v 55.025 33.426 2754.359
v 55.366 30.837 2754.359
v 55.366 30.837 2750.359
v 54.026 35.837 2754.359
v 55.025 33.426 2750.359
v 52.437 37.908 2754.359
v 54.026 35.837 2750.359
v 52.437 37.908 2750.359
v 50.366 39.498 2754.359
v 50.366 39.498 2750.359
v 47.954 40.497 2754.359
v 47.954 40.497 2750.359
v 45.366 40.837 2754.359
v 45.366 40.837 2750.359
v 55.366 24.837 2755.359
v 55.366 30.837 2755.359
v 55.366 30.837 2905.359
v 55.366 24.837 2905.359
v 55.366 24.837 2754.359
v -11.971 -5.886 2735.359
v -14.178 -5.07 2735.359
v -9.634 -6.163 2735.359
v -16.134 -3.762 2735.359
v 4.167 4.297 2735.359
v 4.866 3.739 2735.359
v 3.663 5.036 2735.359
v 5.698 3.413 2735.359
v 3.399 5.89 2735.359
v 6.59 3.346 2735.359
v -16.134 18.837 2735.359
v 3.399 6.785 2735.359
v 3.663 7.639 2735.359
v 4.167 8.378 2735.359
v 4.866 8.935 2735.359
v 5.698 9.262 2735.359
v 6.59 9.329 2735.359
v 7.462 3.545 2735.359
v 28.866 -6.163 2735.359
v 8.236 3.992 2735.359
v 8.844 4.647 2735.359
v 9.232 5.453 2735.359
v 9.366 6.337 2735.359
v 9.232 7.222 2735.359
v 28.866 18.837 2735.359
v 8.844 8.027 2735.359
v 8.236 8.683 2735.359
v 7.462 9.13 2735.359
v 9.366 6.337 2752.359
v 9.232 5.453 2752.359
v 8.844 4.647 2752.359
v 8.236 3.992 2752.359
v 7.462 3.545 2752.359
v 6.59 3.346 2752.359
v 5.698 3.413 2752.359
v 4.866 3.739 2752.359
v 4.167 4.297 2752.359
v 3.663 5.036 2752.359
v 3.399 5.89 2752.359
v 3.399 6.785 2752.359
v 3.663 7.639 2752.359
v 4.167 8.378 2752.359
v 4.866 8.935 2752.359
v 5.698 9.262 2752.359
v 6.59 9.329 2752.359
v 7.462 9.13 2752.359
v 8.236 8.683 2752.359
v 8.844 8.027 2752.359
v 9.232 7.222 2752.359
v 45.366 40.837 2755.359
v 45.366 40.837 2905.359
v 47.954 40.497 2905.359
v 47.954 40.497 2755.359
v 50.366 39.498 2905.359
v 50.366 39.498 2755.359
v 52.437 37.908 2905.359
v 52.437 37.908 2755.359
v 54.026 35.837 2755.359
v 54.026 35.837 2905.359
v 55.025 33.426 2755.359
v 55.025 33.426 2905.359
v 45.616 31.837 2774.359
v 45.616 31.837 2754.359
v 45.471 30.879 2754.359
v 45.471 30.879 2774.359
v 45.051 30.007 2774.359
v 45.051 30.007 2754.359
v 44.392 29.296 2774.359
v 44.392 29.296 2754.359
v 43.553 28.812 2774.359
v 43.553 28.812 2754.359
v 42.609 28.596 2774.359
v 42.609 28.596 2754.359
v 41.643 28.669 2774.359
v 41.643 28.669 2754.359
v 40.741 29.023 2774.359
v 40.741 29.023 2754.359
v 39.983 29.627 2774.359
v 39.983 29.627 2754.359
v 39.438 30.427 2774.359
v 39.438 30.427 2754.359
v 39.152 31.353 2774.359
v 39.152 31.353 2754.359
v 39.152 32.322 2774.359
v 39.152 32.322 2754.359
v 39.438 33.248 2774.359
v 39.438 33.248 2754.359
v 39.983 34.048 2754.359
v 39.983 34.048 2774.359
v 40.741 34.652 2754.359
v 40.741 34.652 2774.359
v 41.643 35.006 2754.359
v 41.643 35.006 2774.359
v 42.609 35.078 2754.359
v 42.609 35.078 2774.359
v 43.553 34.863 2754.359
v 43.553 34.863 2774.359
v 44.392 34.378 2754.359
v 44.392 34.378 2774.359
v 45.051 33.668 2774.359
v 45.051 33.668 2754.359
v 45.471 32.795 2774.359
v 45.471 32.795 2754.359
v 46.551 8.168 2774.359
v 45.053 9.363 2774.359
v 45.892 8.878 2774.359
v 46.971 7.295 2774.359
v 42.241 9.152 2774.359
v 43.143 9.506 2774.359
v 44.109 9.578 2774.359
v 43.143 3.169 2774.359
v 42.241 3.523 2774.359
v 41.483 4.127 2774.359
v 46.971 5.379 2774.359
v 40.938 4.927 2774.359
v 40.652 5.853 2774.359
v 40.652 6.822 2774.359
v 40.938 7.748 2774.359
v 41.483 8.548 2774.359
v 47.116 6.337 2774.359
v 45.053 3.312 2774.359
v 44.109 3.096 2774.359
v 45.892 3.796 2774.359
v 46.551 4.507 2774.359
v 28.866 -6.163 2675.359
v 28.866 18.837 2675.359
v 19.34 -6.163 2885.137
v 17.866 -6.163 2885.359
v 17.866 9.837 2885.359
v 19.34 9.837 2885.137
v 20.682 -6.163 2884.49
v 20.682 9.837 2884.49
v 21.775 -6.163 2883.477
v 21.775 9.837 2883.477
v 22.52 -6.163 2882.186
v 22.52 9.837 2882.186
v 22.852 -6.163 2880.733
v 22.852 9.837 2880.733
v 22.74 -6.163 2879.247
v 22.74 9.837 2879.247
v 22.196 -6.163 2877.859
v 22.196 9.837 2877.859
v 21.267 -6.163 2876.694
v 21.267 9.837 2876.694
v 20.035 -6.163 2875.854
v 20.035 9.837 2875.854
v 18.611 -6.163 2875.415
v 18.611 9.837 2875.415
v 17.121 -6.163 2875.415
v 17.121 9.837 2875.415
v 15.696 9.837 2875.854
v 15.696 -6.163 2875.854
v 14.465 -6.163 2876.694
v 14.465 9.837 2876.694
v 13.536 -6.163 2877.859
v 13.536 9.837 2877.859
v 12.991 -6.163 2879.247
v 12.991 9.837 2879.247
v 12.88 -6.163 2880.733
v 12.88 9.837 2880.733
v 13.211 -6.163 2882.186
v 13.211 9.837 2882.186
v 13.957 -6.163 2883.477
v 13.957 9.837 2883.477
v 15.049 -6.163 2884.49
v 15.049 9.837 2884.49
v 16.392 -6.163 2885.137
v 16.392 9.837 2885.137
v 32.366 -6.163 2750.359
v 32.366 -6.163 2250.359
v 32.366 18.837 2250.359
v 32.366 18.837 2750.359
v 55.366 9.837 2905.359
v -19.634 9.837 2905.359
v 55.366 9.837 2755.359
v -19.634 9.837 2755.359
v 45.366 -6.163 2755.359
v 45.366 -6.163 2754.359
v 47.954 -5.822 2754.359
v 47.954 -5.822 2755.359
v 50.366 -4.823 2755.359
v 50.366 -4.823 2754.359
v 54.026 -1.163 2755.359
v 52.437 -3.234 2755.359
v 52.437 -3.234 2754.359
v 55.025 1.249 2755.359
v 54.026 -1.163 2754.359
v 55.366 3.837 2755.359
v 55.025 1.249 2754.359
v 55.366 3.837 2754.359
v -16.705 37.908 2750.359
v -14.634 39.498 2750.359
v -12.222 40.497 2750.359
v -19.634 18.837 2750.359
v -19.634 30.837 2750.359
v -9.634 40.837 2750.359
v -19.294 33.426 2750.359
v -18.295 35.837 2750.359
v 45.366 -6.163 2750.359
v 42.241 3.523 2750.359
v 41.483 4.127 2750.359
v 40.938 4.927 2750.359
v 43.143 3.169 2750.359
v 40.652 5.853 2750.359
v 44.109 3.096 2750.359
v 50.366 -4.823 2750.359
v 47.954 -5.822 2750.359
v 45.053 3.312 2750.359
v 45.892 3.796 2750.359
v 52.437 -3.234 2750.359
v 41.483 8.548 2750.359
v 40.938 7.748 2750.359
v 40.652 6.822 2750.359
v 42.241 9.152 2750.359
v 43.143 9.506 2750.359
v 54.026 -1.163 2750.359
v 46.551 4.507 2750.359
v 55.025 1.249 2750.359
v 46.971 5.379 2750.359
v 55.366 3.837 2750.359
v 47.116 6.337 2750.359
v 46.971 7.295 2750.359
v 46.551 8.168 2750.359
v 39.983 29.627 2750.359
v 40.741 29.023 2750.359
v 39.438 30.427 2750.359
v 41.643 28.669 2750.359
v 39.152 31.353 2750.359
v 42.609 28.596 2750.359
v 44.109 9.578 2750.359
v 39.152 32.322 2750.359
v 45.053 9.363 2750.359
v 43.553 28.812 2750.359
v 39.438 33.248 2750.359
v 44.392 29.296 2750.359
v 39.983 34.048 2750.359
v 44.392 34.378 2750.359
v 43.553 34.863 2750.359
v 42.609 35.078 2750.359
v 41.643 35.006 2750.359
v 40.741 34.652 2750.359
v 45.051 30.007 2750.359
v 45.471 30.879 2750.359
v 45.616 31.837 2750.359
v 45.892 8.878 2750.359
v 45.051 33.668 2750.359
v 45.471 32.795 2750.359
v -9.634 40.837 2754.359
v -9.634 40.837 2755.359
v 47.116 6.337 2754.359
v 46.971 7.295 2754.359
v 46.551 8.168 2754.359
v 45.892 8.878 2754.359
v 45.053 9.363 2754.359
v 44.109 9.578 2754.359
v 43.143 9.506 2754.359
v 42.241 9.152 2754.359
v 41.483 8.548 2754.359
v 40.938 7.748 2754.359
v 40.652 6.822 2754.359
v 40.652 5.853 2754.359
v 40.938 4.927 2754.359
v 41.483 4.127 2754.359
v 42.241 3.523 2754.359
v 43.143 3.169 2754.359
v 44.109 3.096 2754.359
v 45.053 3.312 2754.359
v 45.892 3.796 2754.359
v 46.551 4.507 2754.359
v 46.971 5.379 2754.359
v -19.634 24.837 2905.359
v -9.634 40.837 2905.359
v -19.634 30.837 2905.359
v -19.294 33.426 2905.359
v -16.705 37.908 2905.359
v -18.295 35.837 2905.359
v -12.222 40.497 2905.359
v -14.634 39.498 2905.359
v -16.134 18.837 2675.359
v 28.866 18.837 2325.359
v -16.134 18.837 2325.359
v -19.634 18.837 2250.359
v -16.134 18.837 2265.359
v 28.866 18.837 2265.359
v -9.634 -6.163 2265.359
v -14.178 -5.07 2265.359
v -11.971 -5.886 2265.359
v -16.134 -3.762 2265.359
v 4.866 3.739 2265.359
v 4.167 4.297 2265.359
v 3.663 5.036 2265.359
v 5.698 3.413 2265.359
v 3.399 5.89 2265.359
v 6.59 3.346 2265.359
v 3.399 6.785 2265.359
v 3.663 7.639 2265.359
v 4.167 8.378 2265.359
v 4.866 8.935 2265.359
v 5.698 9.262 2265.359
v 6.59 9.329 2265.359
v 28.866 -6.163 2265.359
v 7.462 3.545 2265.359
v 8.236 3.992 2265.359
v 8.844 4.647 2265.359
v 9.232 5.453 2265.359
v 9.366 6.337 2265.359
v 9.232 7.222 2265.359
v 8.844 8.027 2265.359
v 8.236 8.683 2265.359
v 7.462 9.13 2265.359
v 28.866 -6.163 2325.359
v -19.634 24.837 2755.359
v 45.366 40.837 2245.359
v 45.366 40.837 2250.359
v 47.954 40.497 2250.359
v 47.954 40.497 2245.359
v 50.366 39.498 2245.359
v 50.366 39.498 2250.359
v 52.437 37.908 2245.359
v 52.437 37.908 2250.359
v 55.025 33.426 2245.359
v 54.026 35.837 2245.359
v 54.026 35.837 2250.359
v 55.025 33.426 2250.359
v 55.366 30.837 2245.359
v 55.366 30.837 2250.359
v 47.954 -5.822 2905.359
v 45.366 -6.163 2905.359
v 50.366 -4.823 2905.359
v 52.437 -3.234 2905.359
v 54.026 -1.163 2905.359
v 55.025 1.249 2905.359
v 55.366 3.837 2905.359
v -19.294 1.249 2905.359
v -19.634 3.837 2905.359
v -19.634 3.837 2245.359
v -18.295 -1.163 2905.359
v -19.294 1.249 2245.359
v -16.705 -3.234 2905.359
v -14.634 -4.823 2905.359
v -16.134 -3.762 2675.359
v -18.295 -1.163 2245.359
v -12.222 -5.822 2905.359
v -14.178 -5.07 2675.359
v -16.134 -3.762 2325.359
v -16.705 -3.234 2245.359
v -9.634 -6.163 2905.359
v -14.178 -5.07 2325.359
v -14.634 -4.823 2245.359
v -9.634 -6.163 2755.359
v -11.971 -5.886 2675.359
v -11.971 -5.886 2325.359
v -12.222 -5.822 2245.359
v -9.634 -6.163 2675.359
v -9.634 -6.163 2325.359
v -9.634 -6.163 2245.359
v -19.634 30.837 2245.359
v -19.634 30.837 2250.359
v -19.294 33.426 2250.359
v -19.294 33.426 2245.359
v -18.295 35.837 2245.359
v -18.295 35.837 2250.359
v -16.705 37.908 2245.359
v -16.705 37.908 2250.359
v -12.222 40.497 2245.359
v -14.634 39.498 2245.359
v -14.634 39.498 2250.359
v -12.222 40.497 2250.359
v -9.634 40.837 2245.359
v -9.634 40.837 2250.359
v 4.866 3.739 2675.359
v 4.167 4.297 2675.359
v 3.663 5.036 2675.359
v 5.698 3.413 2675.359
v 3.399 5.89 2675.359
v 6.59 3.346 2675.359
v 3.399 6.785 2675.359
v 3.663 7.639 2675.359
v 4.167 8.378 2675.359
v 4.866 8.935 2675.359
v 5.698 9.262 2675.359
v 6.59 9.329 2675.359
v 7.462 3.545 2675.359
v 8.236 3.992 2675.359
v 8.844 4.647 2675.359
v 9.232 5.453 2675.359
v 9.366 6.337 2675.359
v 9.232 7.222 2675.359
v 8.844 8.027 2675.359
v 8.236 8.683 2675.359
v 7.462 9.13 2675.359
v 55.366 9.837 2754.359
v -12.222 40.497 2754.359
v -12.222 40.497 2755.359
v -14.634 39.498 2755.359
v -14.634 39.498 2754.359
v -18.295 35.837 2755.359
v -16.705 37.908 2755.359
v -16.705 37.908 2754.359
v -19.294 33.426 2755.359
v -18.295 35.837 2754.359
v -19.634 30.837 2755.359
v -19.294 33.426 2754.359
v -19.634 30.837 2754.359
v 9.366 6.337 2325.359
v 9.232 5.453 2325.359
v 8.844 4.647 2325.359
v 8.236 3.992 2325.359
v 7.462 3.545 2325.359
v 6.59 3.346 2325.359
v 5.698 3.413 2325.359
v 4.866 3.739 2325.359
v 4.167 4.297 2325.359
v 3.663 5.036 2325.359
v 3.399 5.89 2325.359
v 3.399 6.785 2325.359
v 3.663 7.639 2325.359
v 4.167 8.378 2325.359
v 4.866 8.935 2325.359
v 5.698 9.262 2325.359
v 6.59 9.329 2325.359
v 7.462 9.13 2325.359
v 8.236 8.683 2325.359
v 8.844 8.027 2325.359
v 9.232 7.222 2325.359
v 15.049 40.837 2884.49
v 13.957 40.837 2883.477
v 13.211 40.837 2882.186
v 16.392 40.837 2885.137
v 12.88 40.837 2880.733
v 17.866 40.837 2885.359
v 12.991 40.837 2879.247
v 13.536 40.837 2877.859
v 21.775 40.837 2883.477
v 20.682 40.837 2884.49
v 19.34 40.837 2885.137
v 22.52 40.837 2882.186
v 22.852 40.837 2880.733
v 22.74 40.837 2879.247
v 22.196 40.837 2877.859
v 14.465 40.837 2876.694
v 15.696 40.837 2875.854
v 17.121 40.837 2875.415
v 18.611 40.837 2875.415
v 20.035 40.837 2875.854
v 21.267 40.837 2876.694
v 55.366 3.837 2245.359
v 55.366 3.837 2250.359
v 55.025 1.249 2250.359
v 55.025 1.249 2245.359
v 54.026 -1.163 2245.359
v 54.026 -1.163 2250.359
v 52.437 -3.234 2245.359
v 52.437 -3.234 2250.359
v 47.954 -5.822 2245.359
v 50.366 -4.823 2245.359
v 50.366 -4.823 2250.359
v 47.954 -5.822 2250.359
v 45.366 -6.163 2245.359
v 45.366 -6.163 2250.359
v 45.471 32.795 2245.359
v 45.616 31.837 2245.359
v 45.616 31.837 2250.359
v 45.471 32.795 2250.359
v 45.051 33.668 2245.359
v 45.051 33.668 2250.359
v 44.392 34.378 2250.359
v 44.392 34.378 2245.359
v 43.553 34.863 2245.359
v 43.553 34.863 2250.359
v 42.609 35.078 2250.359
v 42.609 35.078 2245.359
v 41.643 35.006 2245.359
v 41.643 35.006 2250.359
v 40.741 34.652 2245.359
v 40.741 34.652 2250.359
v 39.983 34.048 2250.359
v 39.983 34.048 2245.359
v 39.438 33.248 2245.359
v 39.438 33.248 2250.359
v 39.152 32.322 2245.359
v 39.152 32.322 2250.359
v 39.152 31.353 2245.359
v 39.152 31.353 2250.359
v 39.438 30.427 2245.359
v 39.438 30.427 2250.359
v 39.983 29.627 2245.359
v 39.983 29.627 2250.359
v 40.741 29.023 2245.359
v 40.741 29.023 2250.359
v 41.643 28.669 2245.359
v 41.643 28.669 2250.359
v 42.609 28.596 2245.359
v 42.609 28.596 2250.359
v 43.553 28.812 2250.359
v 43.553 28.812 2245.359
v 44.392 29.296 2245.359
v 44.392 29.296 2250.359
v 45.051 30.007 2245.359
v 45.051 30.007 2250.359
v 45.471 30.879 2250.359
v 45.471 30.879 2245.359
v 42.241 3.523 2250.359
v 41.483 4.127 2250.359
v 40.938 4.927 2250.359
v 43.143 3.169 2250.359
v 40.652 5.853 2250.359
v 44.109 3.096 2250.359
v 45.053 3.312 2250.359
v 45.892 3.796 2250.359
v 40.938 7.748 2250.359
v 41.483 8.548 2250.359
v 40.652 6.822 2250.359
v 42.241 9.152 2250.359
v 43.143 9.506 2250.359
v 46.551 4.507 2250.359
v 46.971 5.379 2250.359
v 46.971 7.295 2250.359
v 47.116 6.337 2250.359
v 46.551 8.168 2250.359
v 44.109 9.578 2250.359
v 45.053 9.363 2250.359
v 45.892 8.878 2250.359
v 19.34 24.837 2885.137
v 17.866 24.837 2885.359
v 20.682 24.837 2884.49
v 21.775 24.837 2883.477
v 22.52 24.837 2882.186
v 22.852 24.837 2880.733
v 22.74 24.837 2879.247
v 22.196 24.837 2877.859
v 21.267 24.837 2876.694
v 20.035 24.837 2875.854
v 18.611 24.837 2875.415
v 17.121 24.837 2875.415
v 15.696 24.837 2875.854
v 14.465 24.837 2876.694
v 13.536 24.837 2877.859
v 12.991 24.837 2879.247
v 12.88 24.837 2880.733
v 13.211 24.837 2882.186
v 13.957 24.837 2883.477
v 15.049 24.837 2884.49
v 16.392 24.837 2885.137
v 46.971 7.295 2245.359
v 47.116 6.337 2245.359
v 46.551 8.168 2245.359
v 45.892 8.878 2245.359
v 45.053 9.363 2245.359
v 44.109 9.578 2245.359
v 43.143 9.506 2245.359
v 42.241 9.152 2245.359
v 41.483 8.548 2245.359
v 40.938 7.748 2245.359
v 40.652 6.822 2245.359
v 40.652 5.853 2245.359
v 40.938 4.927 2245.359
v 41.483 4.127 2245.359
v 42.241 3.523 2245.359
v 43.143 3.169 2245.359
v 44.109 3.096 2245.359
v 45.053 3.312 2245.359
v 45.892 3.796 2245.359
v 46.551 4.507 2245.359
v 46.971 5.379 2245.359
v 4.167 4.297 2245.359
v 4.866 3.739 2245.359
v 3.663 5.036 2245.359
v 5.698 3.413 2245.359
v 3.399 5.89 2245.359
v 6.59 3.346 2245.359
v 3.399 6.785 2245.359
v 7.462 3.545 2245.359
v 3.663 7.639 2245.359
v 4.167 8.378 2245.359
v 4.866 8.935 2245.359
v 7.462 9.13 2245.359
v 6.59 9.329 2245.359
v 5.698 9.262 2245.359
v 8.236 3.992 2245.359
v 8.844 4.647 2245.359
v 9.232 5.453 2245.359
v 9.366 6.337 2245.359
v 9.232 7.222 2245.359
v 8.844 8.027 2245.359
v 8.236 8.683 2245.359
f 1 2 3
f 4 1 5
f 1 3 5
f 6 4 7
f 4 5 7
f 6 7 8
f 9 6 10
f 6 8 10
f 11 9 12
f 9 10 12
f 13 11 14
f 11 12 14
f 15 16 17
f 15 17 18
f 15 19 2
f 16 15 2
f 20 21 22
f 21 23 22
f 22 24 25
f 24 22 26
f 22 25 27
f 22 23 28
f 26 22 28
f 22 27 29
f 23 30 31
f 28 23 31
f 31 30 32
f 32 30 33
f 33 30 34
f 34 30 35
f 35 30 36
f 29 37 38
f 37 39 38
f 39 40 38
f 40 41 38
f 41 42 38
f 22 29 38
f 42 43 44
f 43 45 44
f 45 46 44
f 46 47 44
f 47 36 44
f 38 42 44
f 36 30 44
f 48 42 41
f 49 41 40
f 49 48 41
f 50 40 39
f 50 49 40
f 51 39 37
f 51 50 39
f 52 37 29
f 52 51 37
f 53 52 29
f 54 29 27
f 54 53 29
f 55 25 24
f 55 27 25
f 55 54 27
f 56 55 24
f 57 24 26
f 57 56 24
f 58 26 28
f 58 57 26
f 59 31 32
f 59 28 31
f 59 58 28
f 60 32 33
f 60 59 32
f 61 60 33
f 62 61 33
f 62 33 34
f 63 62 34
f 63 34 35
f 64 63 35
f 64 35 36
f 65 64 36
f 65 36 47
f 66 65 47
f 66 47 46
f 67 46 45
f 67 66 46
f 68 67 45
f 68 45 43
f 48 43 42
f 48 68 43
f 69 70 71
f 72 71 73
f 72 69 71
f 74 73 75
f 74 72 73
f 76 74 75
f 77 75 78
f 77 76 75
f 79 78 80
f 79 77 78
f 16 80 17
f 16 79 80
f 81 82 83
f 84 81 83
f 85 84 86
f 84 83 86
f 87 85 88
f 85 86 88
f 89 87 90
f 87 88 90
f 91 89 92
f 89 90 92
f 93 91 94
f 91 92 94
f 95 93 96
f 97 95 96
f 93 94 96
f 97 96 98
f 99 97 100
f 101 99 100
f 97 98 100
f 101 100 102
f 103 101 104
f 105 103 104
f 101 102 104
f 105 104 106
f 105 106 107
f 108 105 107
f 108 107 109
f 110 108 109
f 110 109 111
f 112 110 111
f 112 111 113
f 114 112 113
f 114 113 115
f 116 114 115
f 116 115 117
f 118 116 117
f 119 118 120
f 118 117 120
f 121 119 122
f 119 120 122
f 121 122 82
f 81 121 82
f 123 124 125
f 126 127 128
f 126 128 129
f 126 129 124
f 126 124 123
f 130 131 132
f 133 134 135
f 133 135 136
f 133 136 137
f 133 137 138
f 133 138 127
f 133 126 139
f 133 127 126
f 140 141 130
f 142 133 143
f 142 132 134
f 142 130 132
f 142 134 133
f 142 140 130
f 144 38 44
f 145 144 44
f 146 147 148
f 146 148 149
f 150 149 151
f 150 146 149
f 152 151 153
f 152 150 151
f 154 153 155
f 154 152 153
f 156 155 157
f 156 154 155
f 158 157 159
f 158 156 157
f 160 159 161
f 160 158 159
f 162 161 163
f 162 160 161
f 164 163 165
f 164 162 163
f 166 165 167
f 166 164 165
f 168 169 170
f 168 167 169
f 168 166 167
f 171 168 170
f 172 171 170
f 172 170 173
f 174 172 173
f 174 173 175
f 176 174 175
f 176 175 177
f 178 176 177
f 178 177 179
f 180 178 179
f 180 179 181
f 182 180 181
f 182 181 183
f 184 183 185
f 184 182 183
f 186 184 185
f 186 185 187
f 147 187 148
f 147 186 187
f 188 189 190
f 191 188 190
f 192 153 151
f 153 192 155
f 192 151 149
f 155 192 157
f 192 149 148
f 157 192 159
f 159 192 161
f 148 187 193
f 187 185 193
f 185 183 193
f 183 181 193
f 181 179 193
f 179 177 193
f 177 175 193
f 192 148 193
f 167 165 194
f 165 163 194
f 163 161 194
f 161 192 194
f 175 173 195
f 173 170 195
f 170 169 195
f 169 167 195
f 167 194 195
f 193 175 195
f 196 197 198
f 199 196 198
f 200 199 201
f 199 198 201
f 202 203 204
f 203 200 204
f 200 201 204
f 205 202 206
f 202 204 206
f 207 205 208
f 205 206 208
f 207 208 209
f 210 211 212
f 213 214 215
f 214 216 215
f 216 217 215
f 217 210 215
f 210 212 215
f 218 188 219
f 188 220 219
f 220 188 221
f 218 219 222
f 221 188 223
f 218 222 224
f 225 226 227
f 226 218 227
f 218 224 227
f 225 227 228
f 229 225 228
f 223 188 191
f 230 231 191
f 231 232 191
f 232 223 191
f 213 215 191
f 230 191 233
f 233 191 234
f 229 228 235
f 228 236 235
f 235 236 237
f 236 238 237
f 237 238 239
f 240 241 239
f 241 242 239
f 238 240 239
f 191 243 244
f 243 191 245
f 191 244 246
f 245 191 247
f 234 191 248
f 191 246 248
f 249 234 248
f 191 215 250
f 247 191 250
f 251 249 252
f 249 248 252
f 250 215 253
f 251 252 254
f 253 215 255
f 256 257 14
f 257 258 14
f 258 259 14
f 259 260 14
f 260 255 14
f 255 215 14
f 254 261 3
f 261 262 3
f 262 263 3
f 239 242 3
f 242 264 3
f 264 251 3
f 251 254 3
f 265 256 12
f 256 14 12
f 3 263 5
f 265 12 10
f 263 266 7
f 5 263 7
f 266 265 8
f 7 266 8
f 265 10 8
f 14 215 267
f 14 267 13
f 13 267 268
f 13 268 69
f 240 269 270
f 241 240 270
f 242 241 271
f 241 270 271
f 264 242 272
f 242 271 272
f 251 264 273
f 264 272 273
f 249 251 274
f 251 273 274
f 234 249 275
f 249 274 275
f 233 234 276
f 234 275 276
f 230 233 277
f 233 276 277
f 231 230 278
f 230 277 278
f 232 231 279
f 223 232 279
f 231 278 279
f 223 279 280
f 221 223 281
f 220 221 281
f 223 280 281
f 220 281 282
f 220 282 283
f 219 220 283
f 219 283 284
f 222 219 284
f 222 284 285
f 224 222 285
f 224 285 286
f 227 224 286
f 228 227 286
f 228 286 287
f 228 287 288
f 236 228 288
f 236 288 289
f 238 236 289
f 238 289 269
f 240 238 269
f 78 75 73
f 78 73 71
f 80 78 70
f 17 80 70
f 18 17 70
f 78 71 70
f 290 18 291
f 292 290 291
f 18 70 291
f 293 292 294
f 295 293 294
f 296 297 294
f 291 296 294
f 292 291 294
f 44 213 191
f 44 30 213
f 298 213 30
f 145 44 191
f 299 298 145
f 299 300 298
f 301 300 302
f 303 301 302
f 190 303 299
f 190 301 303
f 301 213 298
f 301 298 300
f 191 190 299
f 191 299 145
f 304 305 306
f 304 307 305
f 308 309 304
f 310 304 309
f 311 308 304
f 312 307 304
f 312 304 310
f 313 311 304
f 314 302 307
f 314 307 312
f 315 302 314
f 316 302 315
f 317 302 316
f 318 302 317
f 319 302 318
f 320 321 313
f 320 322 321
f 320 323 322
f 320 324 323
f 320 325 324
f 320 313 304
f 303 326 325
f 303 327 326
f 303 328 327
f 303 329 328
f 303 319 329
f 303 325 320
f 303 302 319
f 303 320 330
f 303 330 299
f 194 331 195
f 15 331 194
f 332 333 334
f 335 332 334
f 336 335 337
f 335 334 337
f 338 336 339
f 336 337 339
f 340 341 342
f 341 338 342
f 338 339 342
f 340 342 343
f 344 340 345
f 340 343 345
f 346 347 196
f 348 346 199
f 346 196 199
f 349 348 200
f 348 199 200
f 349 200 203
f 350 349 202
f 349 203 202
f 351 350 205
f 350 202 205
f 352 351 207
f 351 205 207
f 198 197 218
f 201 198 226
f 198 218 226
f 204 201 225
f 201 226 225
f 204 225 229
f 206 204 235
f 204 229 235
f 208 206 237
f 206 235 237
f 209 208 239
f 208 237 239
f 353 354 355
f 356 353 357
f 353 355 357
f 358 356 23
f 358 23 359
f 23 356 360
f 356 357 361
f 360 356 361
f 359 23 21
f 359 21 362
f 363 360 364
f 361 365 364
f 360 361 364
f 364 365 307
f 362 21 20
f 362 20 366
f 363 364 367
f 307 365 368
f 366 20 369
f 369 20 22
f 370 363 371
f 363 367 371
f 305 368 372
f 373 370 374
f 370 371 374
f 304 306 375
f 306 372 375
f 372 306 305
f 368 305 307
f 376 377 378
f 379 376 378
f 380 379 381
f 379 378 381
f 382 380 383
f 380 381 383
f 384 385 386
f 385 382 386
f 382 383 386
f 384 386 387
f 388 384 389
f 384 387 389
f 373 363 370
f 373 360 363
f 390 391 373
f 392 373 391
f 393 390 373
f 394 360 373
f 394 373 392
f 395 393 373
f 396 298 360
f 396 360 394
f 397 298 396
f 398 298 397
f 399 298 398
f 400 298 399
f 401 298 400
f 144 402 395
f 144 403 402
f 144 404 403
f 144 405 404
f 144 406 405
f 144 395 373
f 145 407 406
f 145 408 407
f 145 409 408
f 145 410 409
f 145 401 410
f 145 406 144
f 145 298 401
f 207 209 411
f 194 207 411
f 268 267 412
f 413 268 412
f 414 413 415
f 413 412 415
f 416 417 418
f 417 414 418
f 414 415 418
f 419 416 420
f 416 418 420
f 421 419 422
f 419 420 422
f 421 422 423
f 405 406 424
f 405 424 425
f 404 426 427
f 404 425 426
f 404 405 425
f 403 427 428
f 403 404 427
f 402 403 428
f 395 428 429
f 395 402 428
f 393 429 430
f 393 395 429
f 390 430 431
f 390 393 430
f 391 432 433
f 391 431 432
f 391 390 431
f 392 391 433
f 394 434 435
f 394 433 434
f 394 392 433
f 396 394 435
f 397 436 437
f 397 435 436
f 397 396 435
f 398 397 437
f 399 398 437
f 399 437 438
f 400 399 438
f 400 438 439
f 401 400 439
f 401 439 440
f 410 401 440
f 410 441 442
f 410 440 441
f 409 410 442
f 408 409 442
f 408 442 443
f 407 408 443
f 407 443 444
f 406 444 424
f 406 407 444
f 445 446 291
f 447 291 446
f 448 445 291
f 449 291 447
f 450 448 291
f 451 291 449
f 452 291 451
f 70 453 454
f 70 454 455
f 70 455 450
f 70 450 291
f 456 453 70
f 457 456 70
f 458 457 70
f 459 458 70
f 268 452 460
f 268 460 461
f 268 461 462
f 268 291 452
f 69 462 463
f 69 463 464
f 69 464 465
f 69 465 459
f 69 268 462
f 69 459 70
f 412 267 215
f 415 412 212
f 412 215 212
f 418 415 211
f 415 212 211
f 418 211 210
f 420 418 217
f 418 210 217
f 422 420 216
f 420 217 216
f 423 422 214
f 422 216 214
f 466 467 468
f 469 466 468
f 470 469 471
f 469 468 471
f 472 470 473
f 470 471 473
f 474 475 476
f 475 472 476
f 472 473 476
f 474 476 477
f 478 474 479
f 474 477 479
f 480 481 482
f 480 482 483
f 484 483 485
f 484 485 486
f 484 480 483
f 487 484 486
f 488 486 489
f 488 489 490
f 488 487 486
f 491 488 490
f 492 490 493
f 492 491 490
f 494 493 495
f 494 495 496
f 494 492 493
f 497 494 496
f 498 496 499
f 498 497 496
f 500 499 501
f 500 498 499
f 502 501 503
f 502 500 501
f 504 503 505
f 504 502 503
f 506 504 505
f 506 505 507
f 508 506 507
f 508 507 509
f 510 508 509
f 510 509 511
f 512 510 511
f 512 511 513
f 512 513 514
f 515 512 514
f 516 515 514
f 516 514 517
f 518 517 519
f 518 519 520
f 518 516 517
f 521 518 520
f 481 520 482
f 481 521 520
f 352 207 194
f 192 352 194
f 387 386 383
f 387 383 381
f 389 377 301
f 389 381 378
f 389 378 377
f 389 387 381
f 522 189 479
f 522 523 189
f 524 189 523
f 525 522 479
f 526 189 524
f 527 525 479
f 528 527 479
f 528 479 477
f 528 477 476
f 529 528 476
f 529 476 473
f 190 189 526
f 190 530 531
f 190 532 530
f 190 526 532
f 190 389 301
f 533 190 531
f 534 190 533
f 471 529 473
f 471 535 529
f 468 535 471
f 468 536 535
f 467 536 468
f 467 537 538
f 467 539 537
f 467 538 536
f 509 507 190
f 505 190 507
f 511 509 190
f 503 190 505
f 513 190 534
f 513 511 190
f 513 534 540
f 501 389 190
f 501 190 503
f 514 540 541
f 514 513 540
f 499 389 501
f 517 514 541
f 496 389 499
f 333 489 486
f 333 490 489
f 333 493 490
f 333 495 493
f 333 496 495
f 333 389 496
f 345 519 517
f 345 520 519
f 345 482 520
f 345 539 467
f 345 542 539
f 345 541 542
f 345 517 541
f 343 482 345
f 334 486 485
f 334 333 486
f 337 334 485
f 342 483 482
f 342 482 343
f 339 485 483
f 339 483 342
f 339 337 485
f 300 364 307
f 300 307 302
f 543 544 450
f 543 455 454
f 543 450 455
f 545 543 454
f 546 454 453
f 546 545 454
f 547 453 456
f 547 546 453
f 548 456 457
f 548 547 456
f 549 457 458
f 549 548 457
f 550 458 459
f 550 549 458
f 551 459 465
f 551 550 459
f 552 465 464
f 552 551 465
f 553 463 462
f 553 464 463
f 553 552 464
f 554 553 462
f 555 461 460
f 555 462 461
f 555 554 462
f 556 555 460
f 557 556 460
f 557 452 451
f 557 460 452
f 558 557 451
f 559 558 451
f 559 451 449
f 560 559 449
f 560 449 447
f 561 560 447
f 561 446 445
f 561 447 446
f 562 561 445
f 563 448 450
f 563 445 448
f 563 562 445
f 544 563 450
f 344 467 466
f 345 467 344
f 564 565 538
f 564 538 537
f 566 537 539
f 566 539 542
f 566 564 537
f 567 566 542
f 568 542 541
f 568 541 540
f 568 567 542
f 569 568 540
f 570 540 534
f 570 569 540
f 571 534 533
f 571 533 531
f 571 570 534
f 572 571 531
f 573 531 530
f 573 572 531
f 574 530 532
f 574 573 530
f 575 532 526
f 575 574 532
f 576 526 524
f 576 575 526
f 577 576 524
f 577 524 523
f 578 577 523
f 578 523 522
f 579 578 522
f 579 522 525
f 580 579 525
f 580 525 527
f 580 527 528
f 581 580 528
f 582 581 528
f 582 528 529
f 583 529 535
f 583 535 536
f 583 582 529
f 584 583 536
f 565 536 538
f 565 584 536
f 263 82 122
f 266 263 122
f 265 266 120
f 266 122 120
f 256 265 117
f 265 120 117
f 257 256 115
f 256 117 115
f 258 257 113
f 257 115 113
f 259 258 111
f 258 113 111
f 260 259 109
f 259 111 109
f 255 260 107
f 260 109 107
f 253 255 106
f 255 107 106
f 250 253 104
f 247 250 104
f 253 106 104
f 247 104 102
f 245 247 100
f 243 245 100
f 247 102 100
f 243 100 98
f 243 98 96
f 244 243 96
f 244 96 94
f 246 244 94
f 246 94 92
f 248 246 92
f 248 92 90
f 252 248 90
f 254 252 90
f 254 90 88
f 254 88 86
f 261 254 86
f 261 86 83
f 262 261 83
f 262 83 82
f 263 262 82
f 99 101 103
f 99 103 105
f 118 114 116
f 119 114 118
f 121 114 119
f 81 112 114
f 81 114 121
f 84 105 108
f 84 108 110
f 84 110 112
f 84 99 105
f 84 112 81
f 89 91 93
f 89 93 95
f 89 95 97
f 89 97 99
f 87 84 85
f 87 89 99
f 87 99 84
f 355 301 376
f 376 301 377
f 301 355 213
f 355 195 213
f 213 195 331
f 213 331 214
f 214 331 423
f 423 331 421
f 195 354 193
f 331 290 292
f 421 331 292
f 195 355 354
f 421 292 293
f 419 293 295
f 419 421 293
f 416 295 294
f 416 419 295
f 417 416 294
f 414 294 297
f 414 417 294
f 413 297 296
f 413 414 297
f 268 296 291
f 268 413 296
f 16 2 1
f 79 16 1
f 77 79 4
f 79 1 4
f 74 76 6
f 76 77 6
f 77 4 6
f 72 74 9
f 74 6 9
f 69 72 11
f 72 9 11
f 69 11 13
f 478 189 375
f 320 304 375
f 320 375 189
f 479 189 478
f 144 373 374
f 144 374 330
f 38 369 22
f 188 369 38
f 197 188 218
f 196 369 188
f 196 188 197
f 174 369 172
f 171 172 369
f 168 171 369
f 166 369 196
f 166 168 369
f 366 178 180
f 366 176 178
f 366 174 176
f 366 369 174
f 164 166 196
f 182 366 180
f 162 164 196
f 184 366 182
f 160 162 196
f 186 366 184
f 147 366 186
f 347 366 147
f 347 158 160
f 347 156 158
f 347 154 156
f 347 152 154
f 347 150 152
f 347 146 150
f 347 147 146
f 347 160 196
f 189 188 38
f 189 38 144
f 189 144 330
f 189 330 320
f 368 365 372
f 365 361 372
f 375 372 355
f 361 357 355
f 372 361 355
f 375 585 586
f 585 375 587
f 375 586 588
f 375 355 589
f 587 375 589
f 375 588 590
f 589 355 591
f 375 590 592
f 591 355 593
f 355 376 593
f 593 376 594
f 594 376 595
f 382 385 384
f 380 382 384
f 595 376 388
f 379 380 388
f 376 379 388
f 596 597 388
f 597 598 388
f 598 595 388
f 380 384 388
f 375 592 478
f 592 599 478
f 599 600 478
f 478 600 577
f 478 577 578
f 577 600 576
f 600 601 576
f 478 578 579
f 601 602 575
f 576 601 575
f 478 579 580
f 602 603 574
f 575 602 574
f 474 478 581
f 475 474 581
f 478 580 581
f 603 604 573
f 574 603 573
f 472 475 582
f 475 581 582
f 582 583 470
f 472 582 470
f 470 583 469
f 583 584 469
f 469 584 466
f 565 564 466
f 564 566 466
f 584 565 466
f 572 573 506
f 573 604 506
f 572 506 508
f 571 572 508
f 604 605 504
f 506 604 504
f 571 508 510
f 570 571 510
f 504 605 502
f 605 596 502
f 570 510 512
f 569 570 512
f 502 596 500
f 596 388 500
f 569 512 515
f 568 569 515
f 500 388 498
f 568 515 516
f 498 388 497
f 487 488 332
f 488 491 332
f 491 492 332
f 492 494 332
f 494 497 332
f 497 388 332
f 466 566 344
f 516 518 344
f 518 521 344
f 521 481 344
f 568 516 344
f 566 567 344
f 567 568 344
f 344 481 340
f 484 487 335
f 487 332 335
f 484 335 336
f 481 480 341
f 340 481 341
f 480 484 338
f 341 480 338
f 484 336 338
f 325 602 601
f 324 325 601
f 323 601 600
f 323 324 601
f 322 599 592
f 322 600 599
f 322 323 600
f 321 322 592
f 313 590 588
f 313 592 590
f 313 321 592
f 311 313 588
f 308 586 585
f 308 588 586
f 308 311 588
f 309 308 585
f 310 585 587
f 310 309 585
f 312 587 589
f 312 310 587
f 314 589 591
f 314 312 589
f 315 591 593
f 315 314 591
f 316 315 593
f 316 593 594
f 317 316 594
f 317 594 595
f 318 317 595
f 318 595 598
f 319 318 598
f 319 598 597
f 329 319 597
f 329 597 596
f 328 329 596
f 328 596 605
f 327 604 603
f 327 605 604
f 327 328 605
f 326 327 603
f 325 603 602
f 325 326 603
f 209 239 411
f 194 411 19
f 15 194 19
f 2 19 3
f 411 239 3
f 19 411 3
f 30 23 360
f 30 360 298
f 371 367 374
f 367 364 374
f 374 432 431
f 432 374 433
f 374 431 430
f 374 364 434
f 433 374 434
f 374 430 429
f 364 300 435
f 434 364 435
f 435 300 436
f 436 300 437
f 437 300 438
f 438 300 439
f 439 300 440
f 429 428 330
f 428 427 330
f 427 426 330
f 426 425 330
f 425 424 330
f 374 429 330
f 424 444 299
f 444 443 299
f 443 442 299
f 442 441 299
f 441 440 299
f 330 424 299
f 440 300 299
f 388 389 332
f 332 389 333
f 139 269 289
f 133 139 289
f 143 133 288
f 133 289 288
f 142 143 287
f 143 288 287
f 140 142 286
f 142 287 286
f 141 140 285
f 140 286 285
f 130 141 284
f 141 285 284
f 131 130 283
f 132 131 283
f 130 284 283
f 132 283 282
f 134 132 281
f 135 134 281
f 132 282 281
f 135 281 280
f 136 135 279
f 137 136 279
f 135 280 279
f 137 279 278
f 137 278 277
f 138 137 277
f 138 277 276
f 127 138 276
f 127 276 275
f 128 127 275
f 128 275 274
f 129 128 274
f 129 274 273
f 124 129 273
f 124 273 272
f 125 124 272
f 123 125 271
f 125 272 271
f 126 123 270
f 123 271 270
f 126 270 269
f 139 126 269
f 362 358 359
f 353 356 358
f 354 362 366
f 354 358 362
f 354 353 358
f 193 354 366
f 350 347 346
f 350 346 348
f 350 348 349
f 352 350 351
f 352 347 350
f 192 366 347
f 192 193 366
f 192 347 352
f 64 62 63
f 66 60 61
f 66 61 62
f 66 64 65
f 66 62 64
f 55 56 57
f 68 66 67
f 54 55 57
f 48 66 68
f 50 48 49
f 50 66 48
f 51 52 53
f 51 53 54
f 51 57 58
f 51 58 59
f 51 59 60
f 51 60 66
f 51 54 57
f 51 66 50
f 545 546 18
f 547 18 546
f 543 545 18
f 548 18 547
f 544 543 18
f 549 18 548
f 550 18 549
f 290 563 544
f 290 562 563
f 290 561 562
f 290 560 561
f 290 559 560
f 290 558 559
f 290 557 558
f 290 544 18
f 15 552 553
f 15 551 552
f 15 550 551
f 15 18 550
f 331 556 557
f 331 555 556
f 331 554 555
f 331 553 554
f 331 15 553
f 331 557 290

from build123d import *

# Parameters (mm, degrees)
SKETCH1_W                = 520
SKETCH1_H                = 250
BOSS_EXTRUDE1_DEPTH      = 5000
SKETCH2_W                = 450
SKETCH2_H                = 250
CUT_EXTRUDE1_DEPTH       = 600
SKETCH3_W                = 750
SKETCH3_H                = 470
BOSS_EXTRUDE2_DEPTH      = 50
SKETCH4_R                = 32.5
CUT_EXTRUDE2_DEPTH       = 50
CUT_EXTRUDE3_DEPTH       = 4937.509394299
CUT_EXTRUDE3_DEPTH_BACK  = 170
SKETCH5_R                = 30
SCALE2_SCALE             = 0.1
FILLET1_R                = 10
BOSS_EXTRUDE9_DEPTH      = 150
BOSS_EXTRUDE9_DEPTH_BACK = 1
CUT_EXTRUDE4_DEPTH       = 2907.266833376
CUT_EXTRUDE4_DEPTH_BACK  = 2907.266833376
SKETCH7_R                = 5
SKETCH8_R                = 3.25
CUT_EXTRUDE5_DEPTH       = 20


with BuildPart() as part:
    # Sketch1 → Boss-Extrude1 (new body)
    with BuildSketch(Plane.XY):
        Rectangle(SKETCH1_W, SKETCH1_H)
    extrude(amount=BOSS_EXTRUDE1_DEPTH)

    # Sketch2 → Cut-Extrude1 (cut)
    with BuildSketch(Plane.XY.offset(4850)):
        Rectangle(SKETCH2_W, SKETCH2_H)
    cut_extrude1 = extrude(amount=-CUT_EXTRUDE1_DEPTH, mode=Mode.SUBTRACT)

    # Mirror1: Cut-Extrude1 across plane
    add(cut_extrude1.mirror(Plane.XY.offset(2500)), mode=Mode.SUBTRACT)

    # Sketch3 → Boss-Extrude2 (add)
    with BuildSketch(Plane.XY.offset(5000)):
        with Locations((115, 110)):
            Rectangle(SKETCH3_W, SKETCH3_H)
    boss_extrude2 = extrude(amount=BOSS_EXTRUDE2_DEPTH)

    # Sketch4 → Cut-Extrude2 (cut)
    with BuildSketch(Plane.XY.offset(5050)):
        with Locations((375, 0)):
            Circle(SKETCH4_R)
        with Locations((360, 255)):
            Circle(SKETCH4_R)
    cut_extrude2 = extrude(amount=-CUT_EXTRUDE2_DEPTH, mode=Mode.SUBTRACT)

    # Mirror2: Boss-Extrude2, Cut-Extrude2 across plane
    add(boss_extrude2.mirror(Plane.XY.offset(2500)))
    add(cut_extrude2.mirror(Plane.XY.offset(2500)), mode=Mode.SUBTRACT)

    # Sketch5 → Cut-Extrude3 (cut, two sides: drawn at the far end of the back side and taken through both)
    with BuildSketch(Plane(origin=(0, 0, 4850), x_dir=(-1, 0, 0), z_dir=(0, 0, -1)).offset(-CUT_EXTRUDE3_DEPTH_BACK)):
        with Locations(Location((0, 0, 0), (0, 0, 180))):
            Circle(SKETCH5_R)
    extrude(amount=CUT_EXTRUDE3_DEPTH + CUT_EXTRUDE3_DEPTH_BACK, mode=Mode.SUBTRACT)


with BuildPart() as part_1:
    # Scale2: scaled about (7.073044916, 7.041537563, 2500.399199176)
    add(part.part.scale(SCALE2_SCALE).moved(Location((6.365740424, 6.337383807, 2250.359279258))))

    # Fillet1
    # the kernel refuses this fillet: 10 mm, written as the material it takes off along each edge
    with BuildSketch(Plane(origin=(-19.634259576, 40.837383807, 2725.359279258), x_dir=(0, -1, 0), z_dir=(0, 0, 1)), Plane(origin=(55.365740424, 40.837383807, 2725.359279258), x_dir=(-1, 0, 0), z_dir=(0, 0, 1)), Plane(origin=(55.365740424, -6.162616193, 2275.359279258), x_dir=(-1, 0, 0), z_dir=(0, 0, -1))) as fillet1_piece_1:
        with BuildLine():
            CenterArc((FILLET1_R, FILLET1_R), FILLET1_R, 180, 90)
            Line((0, FILLET1_R), (0, 0))
            Line((0, 0), (FILLET1_R, 0))
        make_face()
    extrude(amount=55, mode=Mode.SUBTRACT)
    with BuildSketch(Plane(origin=(55.365740424, -6.162616193, 2725.359279258), x_dir=(-1, 0, 0), z_dir=(0, 0, 1)), Plane(origin=(-19.634259576, 40.837383807, 2275.359279258), x_dir=(0, -1, 0), z_dir=(0, 0, -1)), Plane(origin=(55.365740424, 40.837383807, 2275.359279258), x_dir=(-1, 0, 0), z_dir=(0, 0, -1))) as fillet1_piece_2:
        with BuildLine():
            CenterArc((FILLET1_R, -FILLET1_R), FILLET1_R, 90, 90)
            Line((0, -FILLET1_R), (0, 0))
            Line((0, 0), (FILLET1_R, 0))
        make_face()
    extrude(amount=55, mode=Mode.SUBTRACT)
    with BuildSketch(Plane(origin=(-19.634259576, -6.162616193, 2220.359279258), x_dir=(0, 1, 0), z_dir=(0, 0, 1))) as fillet1_piece_3:
        with BuildLine():
            CenterArc((FILLET1_R, -FILLET1_R), FILLET1_R, 90, 90)
            Line((0, -FILLET1_R), (0, 0))
            Line((0, 0), (FILLET1_R, 0))
        make_face()
    extrude(amount=560, mode=Mode.SUBTRACT)

    # Sketch6 → Boss-Extrude9 (add, two sides: drawn at the far end of the back side and taken through both)
    with BuildSketch(Plane.XY.offset(2755.359279258).offset(-BOSS_EXTRUDE9_DEPTH_BACK)):
        with BuildLine():
            Line((-9.634259575, -6.162616194), (45.365740425, -6.162616194))
            ThreePointArc((45.365740425, -6.162616194), (52.436808237, -3.233684006), (55.365740425, 3.837383806))
            Line((55.365740425, 3.837383806), (55.365740425, 9.837383806))
            Line((55.365740425, 9.837383806), (-19.634259575, 9.837383806))
            Line((-19.634259575, 9.837383806), (-19.634259575, 3.837383806))
            ThreePointArc((-19.634259575, 3.837383806), (-16.705327387, -3.233684006), (-9.634259575, -6.162616194))
        make_face()
        with BuildLine():
            Line((-9.634259575, 40.837383806), (45.365740425, 40.837383806))
            ThreePointArc((45.365740425, 40.837383806), (52.436808237, 37.908451618), (55.365740425, 30.837383806))
            Line((55.365740425, 30.837383806), (55.365740425, 24.837383806))
            Line((55.365740425, 24.837383806), (-19.634259575, 24.837383806))
            Line((-19.634259575, 24.837383806), (-19.634259575, 30.837383806))
            ThreePointArc((-19.634259575, 30.837383806), (-16.705327387, 37.908451618), (-9.634259575, 40.837383806))
        make_face()
    extrude(amount=BOSS_EXTRUDE9_DEPTH + BOSS_EXTRUDE9_DEPTH_BACK)

    # Sketch7 → Cut-Extrude4 (cut, two sides: drawn at the far end of the back side and taken through both)
    with BuildSketch(Plane(origin=(0, 40.837383806, 0), x_dir=(1, 0, 0), z_dir=(0, 1, 0)).offset(-CUT_EXTRUDE4_DEPTH_BACK)):
        with Locations(Location((17.865740425, -2880.359279258, 0), (0, 0, 270))):
            Circle(SKETCH7_R)
    extrude(amount=CUT_EXTRUDE4_DEPTH + CUT_EXTRUDE4_DEPTH_BACK, mode=Mode.SUBTRACT)

    # Sketch8 → Cut-Extrude5 (cut)
    with BuildSketch(Plane(origin=(0, 0, 2754.359279258), x_dir=(-1, 0, 0), z_dir=(0, 0, -1))):
        with Locations(Location((-42.365740425, 31.837383806, 0), (0, 0, 180))):
            Circle(SKETCH8_R)
        with Locations(Location((-43.865740425, 6.337383806, 0), (0, 0, 180))):
            Circle(SKETCH8_R)
    extrude(amount=-CUT_EXTRUDE5_DEPTH, mode=Mode.SUBTRACT)


solid = part_1.part
